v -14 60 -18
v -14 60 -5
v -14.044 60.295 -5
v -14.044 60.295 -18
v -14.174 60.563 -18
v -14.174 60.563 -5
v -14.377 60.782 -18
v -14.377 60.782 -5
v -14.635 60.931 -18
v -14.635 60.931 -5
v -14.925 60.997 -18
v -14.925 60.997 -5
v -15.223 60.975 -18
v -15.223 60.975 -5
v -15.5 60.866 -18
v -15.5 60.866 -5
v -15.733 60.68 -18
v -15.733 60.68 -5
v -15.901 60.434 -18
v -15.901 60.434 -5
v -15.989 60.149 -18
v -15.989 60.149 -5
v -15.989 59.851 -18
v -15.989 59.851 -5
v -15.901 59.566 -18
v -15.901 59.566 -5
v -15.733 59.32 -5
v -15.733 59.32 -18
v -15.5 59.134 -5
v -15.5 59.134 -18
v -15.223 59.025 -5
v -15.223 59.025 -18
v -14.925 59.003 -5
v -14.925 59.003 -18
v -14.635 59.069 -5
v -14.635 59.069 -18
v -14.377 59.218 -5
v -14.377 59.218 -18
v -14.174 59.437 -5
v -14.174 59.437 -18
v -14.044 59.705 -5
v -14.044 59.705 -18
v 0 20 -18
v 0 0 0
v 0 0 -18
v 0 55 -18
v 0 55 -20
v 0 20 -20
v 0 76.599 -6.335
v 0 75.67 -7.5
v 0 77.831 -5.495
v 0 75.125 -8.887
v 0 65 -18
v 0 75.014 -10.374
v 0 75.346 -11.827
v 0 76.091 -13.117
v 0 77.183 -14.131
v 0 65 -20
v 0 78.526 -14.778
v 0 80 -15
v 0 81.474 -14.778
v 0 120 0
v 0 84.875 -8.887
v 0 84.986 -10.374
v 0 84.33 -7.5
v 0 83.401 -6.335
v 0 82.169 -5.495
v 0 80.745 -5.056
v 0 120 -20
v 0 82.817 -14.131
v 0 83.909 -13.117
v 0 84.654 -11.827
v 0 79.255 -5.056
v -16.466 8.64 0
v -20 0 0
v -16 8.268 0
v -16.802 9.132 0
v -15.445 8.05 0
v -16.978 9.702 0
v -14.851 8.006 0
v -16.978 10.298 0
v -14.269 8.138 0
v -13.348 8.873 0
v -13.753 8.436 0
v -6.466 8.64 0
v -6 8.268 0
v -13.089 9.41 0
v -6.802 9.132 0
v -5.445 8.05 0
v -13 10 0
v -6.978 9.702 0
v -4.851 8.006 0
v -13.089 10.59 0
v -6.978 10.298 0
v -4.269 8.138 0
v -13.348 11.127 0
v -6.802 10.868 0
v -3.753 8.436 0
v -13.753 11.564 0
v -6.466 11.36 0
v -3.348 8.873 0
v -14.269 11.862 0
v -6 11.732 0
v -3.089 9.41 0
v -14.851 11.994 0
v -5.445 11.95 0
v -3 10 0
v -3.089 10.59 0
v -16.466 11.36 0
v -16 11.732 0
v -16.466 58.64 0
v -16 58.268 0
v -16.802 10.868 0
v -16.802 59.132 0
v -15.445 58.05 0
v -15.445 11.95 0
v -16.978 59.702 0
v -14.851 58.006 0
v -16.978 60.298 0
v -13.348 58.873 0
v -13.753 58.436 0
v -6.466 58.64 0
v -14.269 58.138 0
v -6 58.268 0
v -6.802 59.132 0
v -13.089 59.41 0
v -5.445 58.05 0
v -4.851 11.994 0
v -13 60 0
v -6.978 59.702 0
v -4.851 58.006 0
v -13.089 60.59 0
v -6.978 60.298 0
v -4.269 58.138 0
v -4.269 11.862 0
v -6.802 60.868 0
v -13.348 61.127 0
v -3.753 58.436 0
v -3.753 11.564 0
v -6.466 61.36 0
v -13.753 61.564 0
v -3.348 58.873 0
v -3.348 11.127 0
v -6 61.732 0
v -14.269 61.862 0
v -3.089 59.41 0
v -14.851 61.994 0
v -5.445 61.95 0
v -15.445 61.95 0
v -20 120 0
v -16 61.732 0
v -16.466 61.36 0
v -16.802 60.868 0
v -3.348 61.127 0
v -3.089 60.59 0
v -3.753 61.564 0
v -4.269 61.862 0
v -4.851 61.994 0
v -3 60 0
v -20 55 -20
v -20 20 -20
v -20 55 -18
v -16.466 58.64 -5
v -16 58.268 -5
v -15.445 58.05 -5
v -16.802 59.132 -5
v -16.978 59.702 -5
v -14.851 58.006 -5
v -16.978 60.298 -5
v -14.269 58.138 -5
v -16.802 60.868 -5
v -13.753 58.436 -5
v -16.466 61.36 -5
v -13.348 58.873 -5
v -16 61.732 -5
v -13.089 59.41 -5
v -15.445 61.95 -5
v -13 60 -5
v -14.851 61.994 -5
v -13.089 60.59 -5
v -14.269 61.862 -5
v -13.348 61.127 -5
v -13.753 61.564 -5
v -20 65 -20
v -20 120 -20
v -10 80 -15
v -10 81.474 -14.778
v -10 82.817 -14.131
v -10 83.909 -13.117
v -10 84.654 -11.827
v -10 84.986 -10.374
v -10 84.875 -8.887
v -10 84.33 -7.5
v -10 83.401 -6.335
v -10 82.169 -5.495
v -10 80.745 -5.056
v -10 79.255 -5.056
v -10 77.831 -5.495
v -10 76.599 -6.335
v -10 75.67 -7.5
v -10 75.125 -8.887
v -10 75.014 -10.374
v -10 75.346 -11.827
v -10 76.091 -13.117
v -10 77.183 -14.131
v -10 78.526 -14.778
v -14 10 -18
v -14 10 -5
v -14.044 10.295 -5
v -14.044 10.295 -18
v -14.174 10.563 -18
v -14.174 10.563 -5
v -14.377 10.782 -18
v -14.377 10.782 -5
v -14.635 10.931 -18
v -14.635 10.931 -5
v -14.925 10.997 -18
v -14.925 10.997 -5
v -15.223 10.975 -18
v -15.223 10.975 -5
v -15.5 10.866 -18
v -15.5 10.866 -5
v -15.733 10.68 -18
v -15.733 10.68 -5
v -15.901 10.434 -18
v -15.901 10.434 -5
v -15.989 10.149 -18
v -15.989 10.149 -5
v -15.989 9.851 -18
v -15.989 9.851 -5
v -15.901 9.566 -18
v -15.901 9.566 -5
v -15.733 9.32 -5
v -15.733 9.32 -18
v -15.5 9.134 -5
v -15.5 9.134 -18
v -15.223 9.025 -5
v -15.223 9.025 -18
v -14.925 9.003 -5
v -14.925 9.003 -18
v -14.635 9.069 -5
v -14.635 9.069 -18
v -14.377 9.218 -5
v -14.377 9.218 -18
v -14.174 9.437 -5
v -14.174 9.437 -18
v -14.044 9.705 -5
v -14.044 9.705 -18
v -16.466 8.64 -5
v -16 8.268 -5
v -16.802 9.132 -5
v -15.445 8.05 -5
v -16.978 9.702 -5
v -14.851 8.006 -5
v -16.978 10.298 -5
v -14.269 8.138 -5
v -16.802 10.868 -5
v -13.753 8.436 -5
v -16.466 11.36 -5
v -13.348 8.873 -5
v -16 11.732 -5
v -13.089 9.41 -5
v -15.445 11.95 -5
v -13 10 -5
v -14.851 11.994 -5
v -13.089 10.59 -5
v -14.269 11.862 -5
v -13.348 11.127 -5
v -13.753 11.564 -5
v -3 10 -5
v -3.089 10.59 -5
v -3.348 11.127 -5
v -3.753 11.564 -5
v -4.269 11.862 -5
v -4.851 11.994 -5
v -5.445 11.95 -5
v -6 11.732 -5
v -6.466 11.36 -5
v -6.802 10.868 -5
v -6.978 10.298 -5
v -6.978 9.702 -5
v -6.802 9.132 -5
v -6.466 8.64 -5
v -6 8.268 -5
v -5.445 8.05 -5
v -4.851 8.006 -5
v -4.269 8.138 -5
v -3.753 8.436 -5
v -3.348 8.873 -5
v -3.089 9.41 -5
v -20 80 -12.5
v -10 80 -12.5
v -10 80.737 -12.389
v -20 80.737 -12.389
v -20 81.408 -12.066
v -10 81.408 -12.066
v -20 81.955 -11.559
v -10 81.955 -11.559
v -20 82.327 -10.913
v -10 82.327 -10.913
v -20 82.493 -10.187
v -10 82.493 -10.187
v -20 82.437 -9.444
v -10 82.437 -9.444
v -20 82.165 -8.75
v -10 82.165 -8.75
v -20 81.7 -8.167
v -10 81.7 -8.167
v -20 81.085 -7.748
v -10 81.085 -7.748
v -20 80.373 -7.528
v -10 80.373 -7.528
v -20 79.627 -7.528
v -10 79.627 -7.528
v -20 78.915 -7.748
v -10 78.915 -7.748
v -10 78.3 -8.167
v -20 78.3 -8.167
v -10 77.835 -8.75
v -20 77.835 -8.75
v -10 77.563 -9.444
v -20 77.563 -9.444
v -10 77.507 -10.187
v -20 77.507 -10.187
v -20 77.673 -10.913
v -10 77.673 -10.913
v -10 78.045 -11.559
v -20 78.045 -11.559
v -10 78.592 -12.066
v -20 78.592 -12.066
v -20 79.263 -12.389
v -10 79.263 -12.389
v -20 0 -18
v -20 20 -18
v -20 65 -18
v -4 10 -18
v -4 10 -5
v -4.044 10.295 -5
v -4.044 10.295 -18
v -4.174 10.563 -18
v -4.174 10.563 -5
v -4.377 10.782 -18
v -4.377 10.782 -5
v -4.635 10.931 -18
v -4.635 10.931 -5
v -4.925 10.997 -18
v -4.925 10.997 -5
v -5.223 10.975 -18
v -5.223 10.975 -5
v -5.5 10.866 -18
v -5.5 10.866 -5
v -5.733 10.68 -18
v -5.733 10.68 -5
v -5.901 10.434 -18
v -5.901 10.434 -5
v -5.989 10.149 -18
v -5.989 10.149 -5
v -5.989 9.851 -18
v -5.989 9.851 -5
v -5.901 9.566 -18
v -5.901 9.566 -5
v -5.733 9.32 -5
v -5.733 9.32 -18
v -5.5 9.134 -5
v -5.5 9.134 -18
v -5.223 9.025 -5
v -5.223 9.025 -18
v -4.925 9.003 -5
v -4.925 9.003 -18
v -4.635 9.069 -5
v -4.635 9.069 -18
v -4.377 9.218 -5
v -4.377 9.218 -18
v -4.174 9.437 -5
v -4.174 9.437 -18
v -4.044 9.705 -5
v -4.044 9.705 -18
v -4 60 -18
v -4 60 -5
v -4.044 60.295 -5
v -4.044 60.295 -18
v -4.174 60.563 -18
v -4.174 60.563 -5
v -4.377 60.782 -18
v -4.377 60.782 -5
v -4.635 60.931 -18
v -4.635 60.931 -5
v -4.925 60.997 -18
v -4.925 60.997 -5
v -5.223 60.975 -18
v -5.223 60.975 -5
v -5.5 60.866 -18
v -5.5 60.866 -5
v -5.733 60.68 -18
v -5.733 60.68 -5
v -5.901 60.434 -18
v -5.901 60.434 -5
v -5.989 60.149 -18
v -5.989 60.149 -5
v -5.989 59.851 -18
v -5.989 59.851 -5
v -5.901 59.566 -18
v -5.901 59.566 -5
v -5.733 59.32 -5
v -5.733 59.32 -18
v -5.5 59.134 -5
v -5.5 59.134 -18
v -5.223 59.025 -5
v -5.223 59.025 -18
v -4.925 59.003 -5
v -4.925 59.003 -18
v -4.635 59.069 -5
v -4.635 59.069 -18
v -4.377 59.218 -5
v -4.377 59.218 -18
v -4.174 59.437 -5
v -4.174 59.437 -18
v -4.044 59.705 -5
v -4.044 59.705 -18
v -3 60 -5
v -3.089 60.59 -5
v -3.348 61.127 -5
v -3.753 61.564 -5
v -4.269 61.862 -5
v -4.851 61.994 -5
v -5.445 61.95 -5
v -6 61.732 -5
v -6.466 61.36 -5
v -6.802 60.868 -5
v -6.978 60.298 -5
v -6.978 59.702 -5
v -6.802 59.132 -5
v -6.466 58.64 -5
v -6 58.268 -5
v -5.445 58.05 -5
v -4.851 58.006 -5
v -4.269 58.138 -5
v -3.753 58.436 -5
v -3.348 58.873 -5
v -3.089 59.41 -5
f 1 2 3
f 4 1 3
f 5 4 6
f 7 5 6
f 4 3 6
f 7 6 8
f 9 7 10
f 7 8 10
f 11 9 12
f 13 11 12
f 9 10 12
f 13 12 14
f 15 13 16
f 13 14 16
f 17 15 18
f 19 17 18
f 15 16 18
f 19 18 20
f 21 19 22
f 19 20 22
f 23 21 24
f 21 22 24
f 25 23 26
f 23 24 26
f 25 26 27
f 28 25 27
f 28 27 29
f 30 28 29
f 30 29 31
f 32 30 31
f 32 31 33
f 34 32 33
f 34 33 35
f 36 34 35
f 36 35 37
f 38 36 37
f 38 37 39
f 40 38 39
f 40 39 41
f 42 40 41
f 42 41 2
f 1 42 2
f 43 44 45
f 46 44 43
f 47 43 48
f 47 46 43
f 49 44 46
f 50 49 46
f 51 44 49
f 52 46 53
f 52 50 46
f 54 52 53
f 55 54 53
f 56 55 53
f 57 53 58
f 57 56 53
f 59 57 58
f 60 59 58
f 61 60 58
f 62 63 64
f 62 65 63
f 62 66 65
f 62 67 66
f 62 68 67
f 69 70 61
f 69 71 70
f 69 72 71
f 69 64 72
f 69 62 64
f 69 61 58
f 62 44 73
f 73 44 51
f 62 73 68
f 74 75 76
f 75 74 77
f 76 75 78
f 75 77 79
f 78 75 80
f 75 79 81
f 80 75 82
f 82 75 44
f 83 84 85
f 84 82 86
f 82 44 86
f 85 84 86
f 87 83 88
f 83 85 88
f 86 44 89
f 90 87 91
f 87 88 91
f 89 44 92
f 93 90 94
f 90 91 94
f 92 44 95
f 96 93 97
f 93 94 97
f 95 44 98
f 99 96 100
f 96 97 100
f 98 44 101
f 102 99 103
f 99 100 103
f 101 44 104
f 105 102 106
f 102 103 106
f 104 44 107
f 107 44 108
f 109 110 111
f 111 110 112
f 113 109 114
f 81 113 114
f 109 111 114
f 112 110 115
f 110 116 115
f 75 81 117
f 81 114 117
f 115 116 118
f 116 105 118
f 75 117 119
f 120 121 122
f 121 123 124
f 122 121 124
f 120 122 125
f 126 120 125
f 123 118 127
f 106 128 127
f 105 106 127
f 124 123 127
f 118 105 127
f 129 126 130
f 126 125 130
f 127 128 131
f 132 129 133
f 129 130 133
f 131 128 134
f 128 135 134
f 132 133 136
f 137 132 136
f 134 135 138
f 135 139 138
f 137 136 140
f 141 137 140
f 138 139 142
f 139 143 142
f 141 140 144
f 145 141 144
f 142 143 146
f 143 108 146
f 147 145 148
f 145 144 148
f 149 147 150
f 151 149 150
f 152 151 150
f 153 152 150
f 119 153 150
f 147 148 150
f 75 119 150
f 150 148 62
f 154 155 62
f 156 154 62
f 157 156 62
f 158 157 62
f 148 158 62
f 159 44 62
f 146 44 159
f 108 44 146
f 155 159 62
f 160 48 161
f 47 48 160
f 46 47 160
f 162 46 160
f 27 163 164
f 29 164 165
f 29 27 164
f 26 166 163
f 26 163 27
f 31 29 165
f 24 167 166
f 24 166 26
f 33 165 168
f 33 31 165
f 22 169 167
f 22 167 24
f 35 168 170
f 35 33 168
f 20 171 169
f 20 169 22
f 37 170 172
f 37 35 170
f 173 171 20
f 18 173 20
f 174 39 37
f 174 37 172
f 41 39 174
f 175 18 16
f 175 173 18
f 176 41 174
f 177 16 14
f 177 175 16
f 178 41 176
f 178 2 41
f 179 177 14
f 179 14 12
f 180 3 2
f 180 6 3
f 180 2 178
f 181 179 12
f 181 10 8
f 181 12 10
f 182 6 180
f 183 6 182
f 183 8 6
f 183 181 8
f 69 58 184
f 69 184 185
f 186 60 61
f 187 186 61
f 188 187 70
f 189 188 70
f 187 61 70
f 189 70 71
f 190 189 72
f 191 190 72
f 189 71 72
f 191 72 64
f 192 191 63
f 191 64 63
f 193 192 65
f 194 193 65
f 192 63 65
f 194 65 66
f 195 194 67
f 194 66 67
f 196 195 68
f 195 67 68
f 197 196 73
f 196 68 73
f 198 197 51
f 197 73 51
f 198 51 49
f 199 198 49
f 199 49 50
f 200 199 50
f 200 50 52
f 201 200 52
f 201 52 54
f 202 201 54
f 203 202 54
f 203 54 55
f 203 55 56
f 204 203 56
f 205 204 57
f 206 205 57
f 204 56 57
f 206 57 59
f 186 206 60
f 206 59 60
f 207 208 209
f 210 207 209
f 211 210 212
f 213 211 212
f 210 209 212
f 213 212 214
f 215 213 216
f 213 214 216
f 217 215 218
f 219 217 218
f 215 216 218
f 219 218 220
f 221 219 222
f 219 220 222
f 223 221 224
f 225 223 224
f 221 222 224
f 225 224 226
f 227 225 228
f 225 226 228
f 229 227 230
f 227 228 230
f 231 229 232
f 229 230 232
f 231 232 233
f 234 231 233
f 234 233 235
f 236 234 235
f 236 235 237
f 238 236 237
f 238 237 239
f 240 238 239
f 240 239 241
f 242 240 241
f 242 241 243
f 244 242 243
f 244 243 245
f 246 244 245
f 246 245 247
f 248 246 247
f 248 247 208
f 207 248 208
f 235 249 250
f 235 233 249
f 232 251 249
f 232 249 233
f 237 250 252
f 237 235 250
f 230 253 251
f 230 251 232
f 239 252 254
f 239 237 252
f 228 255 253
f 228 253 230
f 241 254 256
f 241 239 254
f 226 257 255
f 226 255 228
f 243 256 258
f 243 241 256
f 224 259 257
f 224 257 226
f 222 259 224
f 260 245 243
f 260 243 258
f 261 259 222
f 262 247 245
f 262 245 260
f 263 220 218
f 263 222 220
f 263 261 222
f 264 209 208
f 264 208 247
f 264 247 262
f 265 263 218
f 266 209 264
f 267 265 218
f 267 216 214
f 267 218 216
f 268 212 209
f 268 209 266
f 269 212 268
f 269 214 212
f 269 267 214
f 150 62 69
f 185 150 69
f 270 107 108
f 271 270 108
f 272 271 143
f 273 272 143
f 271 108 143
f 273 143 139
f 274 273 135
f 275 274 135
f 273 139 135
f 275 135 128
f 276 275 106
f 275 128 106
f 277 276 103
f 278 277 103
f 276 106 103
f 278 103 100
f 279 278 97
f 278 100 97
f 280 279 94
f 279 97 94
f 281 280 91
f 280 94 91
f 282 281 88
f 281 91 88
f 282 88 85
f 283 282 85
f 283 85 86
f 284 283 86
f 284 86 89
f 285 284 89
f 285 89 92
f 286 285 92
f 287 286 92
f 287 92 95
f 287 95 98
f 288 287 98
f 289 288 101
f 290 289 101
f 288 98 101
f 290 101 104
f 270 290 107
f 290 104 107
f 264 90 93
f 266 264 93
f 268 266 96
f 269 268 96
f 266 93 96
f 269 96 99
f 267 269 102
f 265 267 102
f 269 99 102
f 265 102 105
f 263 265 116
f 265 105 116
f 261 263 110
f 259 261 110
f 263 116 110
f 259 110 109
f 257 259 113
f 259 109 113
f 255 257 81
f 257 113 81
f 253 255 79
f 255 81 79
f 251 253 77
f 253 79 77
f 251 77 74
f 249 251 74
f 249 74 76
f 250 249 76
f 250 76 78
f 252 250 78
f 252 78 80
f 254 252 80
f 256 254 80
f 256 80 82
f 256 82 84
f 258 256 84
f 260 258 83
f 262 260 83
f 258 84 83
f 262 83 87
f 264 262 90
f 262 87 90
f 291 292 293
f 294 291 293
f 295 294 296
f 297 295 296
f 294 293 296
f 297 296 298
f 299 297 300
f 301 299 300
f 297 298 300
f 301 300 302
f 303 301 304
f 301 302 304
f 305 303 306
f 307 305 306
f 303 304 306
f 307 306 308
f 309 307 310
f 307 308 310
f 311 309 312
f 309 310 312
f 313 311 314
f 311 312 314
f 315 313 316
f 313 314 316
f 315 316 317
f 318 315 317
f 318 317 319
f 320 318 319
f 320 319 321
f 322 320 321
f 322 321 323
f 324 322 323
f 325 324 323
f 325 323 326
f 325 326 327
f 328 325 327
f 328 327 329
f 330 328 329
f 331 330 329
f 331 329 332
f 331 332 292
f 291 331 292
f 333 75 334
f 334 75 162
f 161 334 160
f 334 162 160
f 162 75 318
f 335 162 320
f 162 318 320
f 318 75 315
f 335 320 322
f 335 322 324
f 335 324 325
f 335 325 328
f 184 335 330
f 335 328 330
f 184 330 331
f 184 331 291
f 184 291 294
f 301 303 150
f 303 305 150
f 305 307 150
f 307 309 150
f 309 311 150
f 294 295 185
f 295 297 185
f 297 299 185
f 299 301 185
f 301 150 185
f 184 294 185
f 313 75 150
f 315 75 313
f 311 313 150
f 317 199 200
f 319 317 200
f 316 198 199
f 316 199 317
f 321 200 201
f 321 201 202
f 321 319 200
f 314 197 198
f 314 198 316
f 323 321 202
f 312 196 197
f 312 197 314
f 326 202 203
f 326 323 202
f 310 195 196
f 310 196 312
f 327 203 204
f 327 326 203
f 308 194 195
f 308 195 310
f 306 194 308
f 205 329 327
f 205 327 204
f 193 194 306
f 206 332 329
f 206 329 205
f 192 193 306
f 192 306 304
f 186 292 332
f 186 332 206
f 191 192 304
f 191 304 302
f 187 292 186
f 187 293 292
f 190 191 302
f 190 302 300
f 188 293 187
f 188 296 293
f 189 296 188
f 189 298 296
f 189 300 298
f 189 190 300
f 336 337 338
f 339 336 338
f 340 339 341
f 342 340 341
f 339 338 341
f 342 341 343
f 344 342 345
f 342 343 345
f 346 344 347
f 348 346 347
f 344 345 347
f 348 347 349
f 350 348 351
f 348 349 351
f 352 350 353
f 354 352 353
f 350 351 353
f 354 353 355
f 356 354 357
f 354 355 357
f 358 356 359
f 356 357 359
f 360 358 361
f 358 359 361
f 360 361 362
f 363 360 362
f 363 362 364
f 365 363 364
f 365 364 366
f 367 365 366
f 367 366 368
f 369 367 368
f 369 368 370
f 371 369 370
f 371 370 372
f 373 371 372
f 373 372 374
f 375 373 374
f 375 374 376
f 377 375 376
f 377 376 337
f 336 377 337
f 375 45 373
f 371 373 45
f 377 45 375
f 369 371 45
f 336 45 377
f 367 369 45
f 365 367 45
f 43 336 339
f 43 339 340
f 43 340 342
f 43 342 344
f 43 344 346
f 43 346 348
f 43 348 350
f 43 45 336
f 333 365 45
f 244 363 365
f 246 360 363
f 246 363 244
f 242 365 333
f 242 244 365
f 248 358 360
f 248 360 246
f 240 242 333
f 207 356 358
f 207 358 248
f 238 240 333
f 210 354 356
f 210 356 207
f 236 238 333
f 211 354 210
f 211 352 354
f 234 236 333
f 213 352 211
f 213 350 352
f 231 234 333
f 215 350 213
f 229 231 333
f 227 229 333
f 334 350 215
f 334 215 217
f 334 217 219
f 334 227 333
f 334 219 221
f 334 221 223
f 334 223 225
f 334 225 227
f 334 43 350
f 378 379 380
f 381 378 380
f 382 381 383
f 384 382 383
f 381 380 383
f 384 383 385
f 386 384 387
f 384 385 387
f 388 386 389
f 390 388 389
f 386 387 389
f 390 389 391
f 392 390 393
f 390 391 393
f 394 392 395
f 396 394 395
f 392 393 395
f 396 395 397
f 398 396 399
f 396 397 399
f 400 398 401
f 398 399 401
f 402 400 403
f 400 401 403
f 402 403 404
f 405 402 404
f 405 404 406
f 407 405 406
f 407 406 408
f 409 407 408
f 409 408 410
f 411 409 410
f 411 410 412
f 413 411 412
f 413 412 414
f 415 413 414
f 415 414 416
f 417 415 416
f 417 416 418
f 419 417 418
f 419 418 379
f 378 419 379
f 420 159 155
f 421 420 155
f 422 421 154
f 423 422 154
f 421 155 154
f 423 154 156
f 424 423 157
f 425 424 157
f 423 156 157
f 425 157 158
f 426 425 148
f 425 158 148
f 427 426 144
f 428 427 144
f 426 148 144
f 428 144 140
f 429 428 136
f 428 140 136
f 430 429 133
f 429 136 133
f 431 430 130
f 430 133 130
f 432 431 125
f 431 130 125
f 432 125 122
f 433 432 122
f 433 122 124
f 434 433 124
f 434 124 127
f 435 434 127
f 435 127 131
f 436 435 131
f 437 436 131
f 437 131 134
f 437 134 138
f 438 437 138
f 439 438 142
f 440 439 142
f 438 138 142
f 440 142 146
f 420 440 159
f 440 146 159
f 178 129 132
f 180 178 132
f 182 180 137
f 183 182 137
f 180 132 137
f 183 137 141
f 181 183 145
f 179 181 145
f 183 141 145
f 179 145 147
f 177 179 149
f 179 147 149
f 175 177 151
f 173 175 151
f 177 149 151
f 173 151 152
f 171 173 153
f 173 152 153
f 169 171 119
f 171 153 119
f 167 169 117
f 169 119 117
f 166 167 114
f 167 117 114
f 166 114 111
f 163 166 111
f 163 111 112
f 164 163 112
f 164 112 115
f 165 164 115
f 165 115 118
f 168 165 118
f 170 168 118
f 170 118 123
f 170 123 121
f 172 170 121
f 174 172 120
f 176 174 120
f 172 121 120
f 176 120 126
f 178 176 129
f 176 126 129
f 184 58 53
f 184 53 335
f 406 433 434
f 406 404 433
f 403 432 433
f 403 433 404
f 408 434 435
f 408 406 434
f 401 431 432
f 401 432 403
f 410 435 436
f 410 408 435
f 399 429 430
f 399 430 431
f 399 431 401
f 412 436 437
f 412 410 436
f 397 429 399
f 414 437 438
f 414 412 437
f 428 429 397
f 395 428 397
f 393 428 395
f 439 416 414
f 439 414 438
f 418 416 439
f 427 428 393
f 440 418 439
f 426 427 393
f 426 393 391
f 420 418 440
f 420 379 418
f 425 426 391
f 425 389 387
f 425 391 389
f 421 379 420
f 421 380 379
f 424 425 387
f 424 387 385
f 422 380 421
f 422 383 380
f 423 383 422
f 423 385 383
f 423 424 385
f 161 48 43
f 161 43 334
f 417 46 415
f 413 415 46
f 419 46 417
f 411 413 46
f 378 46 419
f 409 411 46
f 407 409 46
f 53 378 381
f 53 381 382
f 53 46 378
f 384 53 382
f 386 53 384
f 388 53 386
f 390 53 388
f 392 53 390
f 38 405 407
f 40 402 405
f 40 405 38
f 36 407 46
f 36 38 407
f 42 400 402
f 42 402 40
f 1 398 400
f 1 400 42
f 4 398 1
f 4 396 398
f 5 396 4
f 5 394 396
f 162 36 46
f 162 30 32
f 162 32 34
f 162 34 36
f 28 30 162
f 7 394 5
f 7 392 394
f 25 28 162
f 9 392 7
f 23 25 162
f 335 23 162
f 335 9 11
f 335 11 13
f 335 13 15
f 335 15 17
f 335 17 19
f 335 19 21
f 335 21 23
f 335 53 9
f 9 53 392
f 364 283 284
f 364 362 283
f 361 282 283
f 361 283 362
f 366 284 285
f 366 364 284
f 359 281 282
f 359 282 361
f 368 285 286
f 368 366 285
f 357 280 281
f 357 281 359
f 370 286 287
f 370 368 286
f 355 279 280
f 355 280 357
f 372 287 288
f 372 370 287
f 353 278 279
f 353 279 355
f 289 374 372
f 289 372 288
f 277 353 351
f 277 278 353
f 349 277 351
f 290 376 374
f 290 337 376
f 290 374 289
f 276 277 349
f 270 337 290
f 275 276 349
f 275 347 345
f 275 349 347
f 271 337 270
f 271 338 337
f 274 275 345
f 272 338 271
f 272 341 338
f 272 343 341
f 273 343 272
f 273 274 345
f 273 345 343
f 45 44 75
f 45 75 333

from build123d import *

# Parameters (mm, degrees)
SKETCH1_W           = 20
SKETCH1_H           = 120
SKETCH1_R           = 2.5
BOSS_EXTRUDE2_DEPTH = 20
SKETCH10_R          = 5
CUT_EXTRUDE1_DEPTH  = 10
SKETCH11_R          = 1
CUT_EXTRUDE2_DEPTH  = 21
SKETCH12_R          = 2
CUT_EXTRUDE3_DEPTH  = 5
SKETCH11_3_R        = 1
CUT_EXTRUDE4_DEPTH  = 21
SKETCH14_W          = 20
SKETCH14_H          = 10
SKETCH14_H_2        = 20
CUT_EXTRUDE6_DEPTH  = 2


with BuildPart() as part:
    # Sketch1 → Boss-Extrude2 (new body)
    with BuildSketch(Plane(origin=(0, 0, 0), x_dir=(0, 0, -1), z_dir=(1, 0, 0))):
        with Locations((10, 60)):
            Rectangle(SKETCH1_W, SKETCH1_H)
        with Locations((10, 80)):
            Circle(SKETCH1_R, mode=Mode.SUBTRACT)
    extrude(amount=-BOSS_EXTRUDE2_DEPTH)

    # Sketch10 → Cut-Extrude1 (cut)
    with BuildSketch(Plane(origin=(0, 0, 0), x_dir=(0, 0, -1), z_dir=(1, 0, 0))):
        with Locations((10, 80)):
            Circle(SKETCH10_R)
    extrude(amount=-CUT_EXTRUDE1_DEPTH, mode=Mode.SUBTRACT)

    # Sketch11 → Cut-Extrude2 (cut, through all)
    with BuildSketch(Plane.XY):
        with Locations((-15, 10)):
            Circle(SKETCH11_R)
        with Locations((-5, 10)):
            Circle(SKETCH11_R)
    extrude(amount=-CUT_EXTRUDE2_DEPTH, mode=Mode.SUBTRACT)

    # Sketch12 → Cut-Extrude3 (cut)
    with BuildSketch(Plane.XY):
        with Locations((-15, 10)):
            Circle(SKETCH12_R)
        with Locations((-5, 10)):
            Circle(SKETCH12_R)
        with Locations((-15, 60)):
            Circle(SKETCH12_R)
        with Locations((-5, 60)):
            Circle(SKETCH12_R)
    extrude(amount=-CUT_EXTRUDE3_DEPTH, mode=Mode.SUBTRACT)

    # Sketch11<3> → Cut-Extrude4 (cut, through all)
    with BuildSketch(Plane.XY):
        with Locations((-15, 60)):
            Circle(SKETCH11_3_R)
        with Locations((-5, 60)):
            Circle(SKETCH11_3_R)
    extrude(amount=-CUT_EXTRUDE4_DEPTH, mode=Mode.SUBTRACT)

    # Sketch14 → Cut-Extrude6 (cut)
    with BuildSketch(Plane(origin=(0, 0, -20), x_dir=(-1, 0, 0), z_dir=(0, 0, -1))):
        with Locations((10, 60)):
            Rectangle(SKETCH14_W, SKETCH14_H)
        with Locations((10, 10)):
            Rectangle(SKETCH14_W, SKETCH14_H_2)
    extrude(amount=-CUT_EXTRUDE6_DEPTH, mode=Mode.SUBTRACT)


solid = part.part
